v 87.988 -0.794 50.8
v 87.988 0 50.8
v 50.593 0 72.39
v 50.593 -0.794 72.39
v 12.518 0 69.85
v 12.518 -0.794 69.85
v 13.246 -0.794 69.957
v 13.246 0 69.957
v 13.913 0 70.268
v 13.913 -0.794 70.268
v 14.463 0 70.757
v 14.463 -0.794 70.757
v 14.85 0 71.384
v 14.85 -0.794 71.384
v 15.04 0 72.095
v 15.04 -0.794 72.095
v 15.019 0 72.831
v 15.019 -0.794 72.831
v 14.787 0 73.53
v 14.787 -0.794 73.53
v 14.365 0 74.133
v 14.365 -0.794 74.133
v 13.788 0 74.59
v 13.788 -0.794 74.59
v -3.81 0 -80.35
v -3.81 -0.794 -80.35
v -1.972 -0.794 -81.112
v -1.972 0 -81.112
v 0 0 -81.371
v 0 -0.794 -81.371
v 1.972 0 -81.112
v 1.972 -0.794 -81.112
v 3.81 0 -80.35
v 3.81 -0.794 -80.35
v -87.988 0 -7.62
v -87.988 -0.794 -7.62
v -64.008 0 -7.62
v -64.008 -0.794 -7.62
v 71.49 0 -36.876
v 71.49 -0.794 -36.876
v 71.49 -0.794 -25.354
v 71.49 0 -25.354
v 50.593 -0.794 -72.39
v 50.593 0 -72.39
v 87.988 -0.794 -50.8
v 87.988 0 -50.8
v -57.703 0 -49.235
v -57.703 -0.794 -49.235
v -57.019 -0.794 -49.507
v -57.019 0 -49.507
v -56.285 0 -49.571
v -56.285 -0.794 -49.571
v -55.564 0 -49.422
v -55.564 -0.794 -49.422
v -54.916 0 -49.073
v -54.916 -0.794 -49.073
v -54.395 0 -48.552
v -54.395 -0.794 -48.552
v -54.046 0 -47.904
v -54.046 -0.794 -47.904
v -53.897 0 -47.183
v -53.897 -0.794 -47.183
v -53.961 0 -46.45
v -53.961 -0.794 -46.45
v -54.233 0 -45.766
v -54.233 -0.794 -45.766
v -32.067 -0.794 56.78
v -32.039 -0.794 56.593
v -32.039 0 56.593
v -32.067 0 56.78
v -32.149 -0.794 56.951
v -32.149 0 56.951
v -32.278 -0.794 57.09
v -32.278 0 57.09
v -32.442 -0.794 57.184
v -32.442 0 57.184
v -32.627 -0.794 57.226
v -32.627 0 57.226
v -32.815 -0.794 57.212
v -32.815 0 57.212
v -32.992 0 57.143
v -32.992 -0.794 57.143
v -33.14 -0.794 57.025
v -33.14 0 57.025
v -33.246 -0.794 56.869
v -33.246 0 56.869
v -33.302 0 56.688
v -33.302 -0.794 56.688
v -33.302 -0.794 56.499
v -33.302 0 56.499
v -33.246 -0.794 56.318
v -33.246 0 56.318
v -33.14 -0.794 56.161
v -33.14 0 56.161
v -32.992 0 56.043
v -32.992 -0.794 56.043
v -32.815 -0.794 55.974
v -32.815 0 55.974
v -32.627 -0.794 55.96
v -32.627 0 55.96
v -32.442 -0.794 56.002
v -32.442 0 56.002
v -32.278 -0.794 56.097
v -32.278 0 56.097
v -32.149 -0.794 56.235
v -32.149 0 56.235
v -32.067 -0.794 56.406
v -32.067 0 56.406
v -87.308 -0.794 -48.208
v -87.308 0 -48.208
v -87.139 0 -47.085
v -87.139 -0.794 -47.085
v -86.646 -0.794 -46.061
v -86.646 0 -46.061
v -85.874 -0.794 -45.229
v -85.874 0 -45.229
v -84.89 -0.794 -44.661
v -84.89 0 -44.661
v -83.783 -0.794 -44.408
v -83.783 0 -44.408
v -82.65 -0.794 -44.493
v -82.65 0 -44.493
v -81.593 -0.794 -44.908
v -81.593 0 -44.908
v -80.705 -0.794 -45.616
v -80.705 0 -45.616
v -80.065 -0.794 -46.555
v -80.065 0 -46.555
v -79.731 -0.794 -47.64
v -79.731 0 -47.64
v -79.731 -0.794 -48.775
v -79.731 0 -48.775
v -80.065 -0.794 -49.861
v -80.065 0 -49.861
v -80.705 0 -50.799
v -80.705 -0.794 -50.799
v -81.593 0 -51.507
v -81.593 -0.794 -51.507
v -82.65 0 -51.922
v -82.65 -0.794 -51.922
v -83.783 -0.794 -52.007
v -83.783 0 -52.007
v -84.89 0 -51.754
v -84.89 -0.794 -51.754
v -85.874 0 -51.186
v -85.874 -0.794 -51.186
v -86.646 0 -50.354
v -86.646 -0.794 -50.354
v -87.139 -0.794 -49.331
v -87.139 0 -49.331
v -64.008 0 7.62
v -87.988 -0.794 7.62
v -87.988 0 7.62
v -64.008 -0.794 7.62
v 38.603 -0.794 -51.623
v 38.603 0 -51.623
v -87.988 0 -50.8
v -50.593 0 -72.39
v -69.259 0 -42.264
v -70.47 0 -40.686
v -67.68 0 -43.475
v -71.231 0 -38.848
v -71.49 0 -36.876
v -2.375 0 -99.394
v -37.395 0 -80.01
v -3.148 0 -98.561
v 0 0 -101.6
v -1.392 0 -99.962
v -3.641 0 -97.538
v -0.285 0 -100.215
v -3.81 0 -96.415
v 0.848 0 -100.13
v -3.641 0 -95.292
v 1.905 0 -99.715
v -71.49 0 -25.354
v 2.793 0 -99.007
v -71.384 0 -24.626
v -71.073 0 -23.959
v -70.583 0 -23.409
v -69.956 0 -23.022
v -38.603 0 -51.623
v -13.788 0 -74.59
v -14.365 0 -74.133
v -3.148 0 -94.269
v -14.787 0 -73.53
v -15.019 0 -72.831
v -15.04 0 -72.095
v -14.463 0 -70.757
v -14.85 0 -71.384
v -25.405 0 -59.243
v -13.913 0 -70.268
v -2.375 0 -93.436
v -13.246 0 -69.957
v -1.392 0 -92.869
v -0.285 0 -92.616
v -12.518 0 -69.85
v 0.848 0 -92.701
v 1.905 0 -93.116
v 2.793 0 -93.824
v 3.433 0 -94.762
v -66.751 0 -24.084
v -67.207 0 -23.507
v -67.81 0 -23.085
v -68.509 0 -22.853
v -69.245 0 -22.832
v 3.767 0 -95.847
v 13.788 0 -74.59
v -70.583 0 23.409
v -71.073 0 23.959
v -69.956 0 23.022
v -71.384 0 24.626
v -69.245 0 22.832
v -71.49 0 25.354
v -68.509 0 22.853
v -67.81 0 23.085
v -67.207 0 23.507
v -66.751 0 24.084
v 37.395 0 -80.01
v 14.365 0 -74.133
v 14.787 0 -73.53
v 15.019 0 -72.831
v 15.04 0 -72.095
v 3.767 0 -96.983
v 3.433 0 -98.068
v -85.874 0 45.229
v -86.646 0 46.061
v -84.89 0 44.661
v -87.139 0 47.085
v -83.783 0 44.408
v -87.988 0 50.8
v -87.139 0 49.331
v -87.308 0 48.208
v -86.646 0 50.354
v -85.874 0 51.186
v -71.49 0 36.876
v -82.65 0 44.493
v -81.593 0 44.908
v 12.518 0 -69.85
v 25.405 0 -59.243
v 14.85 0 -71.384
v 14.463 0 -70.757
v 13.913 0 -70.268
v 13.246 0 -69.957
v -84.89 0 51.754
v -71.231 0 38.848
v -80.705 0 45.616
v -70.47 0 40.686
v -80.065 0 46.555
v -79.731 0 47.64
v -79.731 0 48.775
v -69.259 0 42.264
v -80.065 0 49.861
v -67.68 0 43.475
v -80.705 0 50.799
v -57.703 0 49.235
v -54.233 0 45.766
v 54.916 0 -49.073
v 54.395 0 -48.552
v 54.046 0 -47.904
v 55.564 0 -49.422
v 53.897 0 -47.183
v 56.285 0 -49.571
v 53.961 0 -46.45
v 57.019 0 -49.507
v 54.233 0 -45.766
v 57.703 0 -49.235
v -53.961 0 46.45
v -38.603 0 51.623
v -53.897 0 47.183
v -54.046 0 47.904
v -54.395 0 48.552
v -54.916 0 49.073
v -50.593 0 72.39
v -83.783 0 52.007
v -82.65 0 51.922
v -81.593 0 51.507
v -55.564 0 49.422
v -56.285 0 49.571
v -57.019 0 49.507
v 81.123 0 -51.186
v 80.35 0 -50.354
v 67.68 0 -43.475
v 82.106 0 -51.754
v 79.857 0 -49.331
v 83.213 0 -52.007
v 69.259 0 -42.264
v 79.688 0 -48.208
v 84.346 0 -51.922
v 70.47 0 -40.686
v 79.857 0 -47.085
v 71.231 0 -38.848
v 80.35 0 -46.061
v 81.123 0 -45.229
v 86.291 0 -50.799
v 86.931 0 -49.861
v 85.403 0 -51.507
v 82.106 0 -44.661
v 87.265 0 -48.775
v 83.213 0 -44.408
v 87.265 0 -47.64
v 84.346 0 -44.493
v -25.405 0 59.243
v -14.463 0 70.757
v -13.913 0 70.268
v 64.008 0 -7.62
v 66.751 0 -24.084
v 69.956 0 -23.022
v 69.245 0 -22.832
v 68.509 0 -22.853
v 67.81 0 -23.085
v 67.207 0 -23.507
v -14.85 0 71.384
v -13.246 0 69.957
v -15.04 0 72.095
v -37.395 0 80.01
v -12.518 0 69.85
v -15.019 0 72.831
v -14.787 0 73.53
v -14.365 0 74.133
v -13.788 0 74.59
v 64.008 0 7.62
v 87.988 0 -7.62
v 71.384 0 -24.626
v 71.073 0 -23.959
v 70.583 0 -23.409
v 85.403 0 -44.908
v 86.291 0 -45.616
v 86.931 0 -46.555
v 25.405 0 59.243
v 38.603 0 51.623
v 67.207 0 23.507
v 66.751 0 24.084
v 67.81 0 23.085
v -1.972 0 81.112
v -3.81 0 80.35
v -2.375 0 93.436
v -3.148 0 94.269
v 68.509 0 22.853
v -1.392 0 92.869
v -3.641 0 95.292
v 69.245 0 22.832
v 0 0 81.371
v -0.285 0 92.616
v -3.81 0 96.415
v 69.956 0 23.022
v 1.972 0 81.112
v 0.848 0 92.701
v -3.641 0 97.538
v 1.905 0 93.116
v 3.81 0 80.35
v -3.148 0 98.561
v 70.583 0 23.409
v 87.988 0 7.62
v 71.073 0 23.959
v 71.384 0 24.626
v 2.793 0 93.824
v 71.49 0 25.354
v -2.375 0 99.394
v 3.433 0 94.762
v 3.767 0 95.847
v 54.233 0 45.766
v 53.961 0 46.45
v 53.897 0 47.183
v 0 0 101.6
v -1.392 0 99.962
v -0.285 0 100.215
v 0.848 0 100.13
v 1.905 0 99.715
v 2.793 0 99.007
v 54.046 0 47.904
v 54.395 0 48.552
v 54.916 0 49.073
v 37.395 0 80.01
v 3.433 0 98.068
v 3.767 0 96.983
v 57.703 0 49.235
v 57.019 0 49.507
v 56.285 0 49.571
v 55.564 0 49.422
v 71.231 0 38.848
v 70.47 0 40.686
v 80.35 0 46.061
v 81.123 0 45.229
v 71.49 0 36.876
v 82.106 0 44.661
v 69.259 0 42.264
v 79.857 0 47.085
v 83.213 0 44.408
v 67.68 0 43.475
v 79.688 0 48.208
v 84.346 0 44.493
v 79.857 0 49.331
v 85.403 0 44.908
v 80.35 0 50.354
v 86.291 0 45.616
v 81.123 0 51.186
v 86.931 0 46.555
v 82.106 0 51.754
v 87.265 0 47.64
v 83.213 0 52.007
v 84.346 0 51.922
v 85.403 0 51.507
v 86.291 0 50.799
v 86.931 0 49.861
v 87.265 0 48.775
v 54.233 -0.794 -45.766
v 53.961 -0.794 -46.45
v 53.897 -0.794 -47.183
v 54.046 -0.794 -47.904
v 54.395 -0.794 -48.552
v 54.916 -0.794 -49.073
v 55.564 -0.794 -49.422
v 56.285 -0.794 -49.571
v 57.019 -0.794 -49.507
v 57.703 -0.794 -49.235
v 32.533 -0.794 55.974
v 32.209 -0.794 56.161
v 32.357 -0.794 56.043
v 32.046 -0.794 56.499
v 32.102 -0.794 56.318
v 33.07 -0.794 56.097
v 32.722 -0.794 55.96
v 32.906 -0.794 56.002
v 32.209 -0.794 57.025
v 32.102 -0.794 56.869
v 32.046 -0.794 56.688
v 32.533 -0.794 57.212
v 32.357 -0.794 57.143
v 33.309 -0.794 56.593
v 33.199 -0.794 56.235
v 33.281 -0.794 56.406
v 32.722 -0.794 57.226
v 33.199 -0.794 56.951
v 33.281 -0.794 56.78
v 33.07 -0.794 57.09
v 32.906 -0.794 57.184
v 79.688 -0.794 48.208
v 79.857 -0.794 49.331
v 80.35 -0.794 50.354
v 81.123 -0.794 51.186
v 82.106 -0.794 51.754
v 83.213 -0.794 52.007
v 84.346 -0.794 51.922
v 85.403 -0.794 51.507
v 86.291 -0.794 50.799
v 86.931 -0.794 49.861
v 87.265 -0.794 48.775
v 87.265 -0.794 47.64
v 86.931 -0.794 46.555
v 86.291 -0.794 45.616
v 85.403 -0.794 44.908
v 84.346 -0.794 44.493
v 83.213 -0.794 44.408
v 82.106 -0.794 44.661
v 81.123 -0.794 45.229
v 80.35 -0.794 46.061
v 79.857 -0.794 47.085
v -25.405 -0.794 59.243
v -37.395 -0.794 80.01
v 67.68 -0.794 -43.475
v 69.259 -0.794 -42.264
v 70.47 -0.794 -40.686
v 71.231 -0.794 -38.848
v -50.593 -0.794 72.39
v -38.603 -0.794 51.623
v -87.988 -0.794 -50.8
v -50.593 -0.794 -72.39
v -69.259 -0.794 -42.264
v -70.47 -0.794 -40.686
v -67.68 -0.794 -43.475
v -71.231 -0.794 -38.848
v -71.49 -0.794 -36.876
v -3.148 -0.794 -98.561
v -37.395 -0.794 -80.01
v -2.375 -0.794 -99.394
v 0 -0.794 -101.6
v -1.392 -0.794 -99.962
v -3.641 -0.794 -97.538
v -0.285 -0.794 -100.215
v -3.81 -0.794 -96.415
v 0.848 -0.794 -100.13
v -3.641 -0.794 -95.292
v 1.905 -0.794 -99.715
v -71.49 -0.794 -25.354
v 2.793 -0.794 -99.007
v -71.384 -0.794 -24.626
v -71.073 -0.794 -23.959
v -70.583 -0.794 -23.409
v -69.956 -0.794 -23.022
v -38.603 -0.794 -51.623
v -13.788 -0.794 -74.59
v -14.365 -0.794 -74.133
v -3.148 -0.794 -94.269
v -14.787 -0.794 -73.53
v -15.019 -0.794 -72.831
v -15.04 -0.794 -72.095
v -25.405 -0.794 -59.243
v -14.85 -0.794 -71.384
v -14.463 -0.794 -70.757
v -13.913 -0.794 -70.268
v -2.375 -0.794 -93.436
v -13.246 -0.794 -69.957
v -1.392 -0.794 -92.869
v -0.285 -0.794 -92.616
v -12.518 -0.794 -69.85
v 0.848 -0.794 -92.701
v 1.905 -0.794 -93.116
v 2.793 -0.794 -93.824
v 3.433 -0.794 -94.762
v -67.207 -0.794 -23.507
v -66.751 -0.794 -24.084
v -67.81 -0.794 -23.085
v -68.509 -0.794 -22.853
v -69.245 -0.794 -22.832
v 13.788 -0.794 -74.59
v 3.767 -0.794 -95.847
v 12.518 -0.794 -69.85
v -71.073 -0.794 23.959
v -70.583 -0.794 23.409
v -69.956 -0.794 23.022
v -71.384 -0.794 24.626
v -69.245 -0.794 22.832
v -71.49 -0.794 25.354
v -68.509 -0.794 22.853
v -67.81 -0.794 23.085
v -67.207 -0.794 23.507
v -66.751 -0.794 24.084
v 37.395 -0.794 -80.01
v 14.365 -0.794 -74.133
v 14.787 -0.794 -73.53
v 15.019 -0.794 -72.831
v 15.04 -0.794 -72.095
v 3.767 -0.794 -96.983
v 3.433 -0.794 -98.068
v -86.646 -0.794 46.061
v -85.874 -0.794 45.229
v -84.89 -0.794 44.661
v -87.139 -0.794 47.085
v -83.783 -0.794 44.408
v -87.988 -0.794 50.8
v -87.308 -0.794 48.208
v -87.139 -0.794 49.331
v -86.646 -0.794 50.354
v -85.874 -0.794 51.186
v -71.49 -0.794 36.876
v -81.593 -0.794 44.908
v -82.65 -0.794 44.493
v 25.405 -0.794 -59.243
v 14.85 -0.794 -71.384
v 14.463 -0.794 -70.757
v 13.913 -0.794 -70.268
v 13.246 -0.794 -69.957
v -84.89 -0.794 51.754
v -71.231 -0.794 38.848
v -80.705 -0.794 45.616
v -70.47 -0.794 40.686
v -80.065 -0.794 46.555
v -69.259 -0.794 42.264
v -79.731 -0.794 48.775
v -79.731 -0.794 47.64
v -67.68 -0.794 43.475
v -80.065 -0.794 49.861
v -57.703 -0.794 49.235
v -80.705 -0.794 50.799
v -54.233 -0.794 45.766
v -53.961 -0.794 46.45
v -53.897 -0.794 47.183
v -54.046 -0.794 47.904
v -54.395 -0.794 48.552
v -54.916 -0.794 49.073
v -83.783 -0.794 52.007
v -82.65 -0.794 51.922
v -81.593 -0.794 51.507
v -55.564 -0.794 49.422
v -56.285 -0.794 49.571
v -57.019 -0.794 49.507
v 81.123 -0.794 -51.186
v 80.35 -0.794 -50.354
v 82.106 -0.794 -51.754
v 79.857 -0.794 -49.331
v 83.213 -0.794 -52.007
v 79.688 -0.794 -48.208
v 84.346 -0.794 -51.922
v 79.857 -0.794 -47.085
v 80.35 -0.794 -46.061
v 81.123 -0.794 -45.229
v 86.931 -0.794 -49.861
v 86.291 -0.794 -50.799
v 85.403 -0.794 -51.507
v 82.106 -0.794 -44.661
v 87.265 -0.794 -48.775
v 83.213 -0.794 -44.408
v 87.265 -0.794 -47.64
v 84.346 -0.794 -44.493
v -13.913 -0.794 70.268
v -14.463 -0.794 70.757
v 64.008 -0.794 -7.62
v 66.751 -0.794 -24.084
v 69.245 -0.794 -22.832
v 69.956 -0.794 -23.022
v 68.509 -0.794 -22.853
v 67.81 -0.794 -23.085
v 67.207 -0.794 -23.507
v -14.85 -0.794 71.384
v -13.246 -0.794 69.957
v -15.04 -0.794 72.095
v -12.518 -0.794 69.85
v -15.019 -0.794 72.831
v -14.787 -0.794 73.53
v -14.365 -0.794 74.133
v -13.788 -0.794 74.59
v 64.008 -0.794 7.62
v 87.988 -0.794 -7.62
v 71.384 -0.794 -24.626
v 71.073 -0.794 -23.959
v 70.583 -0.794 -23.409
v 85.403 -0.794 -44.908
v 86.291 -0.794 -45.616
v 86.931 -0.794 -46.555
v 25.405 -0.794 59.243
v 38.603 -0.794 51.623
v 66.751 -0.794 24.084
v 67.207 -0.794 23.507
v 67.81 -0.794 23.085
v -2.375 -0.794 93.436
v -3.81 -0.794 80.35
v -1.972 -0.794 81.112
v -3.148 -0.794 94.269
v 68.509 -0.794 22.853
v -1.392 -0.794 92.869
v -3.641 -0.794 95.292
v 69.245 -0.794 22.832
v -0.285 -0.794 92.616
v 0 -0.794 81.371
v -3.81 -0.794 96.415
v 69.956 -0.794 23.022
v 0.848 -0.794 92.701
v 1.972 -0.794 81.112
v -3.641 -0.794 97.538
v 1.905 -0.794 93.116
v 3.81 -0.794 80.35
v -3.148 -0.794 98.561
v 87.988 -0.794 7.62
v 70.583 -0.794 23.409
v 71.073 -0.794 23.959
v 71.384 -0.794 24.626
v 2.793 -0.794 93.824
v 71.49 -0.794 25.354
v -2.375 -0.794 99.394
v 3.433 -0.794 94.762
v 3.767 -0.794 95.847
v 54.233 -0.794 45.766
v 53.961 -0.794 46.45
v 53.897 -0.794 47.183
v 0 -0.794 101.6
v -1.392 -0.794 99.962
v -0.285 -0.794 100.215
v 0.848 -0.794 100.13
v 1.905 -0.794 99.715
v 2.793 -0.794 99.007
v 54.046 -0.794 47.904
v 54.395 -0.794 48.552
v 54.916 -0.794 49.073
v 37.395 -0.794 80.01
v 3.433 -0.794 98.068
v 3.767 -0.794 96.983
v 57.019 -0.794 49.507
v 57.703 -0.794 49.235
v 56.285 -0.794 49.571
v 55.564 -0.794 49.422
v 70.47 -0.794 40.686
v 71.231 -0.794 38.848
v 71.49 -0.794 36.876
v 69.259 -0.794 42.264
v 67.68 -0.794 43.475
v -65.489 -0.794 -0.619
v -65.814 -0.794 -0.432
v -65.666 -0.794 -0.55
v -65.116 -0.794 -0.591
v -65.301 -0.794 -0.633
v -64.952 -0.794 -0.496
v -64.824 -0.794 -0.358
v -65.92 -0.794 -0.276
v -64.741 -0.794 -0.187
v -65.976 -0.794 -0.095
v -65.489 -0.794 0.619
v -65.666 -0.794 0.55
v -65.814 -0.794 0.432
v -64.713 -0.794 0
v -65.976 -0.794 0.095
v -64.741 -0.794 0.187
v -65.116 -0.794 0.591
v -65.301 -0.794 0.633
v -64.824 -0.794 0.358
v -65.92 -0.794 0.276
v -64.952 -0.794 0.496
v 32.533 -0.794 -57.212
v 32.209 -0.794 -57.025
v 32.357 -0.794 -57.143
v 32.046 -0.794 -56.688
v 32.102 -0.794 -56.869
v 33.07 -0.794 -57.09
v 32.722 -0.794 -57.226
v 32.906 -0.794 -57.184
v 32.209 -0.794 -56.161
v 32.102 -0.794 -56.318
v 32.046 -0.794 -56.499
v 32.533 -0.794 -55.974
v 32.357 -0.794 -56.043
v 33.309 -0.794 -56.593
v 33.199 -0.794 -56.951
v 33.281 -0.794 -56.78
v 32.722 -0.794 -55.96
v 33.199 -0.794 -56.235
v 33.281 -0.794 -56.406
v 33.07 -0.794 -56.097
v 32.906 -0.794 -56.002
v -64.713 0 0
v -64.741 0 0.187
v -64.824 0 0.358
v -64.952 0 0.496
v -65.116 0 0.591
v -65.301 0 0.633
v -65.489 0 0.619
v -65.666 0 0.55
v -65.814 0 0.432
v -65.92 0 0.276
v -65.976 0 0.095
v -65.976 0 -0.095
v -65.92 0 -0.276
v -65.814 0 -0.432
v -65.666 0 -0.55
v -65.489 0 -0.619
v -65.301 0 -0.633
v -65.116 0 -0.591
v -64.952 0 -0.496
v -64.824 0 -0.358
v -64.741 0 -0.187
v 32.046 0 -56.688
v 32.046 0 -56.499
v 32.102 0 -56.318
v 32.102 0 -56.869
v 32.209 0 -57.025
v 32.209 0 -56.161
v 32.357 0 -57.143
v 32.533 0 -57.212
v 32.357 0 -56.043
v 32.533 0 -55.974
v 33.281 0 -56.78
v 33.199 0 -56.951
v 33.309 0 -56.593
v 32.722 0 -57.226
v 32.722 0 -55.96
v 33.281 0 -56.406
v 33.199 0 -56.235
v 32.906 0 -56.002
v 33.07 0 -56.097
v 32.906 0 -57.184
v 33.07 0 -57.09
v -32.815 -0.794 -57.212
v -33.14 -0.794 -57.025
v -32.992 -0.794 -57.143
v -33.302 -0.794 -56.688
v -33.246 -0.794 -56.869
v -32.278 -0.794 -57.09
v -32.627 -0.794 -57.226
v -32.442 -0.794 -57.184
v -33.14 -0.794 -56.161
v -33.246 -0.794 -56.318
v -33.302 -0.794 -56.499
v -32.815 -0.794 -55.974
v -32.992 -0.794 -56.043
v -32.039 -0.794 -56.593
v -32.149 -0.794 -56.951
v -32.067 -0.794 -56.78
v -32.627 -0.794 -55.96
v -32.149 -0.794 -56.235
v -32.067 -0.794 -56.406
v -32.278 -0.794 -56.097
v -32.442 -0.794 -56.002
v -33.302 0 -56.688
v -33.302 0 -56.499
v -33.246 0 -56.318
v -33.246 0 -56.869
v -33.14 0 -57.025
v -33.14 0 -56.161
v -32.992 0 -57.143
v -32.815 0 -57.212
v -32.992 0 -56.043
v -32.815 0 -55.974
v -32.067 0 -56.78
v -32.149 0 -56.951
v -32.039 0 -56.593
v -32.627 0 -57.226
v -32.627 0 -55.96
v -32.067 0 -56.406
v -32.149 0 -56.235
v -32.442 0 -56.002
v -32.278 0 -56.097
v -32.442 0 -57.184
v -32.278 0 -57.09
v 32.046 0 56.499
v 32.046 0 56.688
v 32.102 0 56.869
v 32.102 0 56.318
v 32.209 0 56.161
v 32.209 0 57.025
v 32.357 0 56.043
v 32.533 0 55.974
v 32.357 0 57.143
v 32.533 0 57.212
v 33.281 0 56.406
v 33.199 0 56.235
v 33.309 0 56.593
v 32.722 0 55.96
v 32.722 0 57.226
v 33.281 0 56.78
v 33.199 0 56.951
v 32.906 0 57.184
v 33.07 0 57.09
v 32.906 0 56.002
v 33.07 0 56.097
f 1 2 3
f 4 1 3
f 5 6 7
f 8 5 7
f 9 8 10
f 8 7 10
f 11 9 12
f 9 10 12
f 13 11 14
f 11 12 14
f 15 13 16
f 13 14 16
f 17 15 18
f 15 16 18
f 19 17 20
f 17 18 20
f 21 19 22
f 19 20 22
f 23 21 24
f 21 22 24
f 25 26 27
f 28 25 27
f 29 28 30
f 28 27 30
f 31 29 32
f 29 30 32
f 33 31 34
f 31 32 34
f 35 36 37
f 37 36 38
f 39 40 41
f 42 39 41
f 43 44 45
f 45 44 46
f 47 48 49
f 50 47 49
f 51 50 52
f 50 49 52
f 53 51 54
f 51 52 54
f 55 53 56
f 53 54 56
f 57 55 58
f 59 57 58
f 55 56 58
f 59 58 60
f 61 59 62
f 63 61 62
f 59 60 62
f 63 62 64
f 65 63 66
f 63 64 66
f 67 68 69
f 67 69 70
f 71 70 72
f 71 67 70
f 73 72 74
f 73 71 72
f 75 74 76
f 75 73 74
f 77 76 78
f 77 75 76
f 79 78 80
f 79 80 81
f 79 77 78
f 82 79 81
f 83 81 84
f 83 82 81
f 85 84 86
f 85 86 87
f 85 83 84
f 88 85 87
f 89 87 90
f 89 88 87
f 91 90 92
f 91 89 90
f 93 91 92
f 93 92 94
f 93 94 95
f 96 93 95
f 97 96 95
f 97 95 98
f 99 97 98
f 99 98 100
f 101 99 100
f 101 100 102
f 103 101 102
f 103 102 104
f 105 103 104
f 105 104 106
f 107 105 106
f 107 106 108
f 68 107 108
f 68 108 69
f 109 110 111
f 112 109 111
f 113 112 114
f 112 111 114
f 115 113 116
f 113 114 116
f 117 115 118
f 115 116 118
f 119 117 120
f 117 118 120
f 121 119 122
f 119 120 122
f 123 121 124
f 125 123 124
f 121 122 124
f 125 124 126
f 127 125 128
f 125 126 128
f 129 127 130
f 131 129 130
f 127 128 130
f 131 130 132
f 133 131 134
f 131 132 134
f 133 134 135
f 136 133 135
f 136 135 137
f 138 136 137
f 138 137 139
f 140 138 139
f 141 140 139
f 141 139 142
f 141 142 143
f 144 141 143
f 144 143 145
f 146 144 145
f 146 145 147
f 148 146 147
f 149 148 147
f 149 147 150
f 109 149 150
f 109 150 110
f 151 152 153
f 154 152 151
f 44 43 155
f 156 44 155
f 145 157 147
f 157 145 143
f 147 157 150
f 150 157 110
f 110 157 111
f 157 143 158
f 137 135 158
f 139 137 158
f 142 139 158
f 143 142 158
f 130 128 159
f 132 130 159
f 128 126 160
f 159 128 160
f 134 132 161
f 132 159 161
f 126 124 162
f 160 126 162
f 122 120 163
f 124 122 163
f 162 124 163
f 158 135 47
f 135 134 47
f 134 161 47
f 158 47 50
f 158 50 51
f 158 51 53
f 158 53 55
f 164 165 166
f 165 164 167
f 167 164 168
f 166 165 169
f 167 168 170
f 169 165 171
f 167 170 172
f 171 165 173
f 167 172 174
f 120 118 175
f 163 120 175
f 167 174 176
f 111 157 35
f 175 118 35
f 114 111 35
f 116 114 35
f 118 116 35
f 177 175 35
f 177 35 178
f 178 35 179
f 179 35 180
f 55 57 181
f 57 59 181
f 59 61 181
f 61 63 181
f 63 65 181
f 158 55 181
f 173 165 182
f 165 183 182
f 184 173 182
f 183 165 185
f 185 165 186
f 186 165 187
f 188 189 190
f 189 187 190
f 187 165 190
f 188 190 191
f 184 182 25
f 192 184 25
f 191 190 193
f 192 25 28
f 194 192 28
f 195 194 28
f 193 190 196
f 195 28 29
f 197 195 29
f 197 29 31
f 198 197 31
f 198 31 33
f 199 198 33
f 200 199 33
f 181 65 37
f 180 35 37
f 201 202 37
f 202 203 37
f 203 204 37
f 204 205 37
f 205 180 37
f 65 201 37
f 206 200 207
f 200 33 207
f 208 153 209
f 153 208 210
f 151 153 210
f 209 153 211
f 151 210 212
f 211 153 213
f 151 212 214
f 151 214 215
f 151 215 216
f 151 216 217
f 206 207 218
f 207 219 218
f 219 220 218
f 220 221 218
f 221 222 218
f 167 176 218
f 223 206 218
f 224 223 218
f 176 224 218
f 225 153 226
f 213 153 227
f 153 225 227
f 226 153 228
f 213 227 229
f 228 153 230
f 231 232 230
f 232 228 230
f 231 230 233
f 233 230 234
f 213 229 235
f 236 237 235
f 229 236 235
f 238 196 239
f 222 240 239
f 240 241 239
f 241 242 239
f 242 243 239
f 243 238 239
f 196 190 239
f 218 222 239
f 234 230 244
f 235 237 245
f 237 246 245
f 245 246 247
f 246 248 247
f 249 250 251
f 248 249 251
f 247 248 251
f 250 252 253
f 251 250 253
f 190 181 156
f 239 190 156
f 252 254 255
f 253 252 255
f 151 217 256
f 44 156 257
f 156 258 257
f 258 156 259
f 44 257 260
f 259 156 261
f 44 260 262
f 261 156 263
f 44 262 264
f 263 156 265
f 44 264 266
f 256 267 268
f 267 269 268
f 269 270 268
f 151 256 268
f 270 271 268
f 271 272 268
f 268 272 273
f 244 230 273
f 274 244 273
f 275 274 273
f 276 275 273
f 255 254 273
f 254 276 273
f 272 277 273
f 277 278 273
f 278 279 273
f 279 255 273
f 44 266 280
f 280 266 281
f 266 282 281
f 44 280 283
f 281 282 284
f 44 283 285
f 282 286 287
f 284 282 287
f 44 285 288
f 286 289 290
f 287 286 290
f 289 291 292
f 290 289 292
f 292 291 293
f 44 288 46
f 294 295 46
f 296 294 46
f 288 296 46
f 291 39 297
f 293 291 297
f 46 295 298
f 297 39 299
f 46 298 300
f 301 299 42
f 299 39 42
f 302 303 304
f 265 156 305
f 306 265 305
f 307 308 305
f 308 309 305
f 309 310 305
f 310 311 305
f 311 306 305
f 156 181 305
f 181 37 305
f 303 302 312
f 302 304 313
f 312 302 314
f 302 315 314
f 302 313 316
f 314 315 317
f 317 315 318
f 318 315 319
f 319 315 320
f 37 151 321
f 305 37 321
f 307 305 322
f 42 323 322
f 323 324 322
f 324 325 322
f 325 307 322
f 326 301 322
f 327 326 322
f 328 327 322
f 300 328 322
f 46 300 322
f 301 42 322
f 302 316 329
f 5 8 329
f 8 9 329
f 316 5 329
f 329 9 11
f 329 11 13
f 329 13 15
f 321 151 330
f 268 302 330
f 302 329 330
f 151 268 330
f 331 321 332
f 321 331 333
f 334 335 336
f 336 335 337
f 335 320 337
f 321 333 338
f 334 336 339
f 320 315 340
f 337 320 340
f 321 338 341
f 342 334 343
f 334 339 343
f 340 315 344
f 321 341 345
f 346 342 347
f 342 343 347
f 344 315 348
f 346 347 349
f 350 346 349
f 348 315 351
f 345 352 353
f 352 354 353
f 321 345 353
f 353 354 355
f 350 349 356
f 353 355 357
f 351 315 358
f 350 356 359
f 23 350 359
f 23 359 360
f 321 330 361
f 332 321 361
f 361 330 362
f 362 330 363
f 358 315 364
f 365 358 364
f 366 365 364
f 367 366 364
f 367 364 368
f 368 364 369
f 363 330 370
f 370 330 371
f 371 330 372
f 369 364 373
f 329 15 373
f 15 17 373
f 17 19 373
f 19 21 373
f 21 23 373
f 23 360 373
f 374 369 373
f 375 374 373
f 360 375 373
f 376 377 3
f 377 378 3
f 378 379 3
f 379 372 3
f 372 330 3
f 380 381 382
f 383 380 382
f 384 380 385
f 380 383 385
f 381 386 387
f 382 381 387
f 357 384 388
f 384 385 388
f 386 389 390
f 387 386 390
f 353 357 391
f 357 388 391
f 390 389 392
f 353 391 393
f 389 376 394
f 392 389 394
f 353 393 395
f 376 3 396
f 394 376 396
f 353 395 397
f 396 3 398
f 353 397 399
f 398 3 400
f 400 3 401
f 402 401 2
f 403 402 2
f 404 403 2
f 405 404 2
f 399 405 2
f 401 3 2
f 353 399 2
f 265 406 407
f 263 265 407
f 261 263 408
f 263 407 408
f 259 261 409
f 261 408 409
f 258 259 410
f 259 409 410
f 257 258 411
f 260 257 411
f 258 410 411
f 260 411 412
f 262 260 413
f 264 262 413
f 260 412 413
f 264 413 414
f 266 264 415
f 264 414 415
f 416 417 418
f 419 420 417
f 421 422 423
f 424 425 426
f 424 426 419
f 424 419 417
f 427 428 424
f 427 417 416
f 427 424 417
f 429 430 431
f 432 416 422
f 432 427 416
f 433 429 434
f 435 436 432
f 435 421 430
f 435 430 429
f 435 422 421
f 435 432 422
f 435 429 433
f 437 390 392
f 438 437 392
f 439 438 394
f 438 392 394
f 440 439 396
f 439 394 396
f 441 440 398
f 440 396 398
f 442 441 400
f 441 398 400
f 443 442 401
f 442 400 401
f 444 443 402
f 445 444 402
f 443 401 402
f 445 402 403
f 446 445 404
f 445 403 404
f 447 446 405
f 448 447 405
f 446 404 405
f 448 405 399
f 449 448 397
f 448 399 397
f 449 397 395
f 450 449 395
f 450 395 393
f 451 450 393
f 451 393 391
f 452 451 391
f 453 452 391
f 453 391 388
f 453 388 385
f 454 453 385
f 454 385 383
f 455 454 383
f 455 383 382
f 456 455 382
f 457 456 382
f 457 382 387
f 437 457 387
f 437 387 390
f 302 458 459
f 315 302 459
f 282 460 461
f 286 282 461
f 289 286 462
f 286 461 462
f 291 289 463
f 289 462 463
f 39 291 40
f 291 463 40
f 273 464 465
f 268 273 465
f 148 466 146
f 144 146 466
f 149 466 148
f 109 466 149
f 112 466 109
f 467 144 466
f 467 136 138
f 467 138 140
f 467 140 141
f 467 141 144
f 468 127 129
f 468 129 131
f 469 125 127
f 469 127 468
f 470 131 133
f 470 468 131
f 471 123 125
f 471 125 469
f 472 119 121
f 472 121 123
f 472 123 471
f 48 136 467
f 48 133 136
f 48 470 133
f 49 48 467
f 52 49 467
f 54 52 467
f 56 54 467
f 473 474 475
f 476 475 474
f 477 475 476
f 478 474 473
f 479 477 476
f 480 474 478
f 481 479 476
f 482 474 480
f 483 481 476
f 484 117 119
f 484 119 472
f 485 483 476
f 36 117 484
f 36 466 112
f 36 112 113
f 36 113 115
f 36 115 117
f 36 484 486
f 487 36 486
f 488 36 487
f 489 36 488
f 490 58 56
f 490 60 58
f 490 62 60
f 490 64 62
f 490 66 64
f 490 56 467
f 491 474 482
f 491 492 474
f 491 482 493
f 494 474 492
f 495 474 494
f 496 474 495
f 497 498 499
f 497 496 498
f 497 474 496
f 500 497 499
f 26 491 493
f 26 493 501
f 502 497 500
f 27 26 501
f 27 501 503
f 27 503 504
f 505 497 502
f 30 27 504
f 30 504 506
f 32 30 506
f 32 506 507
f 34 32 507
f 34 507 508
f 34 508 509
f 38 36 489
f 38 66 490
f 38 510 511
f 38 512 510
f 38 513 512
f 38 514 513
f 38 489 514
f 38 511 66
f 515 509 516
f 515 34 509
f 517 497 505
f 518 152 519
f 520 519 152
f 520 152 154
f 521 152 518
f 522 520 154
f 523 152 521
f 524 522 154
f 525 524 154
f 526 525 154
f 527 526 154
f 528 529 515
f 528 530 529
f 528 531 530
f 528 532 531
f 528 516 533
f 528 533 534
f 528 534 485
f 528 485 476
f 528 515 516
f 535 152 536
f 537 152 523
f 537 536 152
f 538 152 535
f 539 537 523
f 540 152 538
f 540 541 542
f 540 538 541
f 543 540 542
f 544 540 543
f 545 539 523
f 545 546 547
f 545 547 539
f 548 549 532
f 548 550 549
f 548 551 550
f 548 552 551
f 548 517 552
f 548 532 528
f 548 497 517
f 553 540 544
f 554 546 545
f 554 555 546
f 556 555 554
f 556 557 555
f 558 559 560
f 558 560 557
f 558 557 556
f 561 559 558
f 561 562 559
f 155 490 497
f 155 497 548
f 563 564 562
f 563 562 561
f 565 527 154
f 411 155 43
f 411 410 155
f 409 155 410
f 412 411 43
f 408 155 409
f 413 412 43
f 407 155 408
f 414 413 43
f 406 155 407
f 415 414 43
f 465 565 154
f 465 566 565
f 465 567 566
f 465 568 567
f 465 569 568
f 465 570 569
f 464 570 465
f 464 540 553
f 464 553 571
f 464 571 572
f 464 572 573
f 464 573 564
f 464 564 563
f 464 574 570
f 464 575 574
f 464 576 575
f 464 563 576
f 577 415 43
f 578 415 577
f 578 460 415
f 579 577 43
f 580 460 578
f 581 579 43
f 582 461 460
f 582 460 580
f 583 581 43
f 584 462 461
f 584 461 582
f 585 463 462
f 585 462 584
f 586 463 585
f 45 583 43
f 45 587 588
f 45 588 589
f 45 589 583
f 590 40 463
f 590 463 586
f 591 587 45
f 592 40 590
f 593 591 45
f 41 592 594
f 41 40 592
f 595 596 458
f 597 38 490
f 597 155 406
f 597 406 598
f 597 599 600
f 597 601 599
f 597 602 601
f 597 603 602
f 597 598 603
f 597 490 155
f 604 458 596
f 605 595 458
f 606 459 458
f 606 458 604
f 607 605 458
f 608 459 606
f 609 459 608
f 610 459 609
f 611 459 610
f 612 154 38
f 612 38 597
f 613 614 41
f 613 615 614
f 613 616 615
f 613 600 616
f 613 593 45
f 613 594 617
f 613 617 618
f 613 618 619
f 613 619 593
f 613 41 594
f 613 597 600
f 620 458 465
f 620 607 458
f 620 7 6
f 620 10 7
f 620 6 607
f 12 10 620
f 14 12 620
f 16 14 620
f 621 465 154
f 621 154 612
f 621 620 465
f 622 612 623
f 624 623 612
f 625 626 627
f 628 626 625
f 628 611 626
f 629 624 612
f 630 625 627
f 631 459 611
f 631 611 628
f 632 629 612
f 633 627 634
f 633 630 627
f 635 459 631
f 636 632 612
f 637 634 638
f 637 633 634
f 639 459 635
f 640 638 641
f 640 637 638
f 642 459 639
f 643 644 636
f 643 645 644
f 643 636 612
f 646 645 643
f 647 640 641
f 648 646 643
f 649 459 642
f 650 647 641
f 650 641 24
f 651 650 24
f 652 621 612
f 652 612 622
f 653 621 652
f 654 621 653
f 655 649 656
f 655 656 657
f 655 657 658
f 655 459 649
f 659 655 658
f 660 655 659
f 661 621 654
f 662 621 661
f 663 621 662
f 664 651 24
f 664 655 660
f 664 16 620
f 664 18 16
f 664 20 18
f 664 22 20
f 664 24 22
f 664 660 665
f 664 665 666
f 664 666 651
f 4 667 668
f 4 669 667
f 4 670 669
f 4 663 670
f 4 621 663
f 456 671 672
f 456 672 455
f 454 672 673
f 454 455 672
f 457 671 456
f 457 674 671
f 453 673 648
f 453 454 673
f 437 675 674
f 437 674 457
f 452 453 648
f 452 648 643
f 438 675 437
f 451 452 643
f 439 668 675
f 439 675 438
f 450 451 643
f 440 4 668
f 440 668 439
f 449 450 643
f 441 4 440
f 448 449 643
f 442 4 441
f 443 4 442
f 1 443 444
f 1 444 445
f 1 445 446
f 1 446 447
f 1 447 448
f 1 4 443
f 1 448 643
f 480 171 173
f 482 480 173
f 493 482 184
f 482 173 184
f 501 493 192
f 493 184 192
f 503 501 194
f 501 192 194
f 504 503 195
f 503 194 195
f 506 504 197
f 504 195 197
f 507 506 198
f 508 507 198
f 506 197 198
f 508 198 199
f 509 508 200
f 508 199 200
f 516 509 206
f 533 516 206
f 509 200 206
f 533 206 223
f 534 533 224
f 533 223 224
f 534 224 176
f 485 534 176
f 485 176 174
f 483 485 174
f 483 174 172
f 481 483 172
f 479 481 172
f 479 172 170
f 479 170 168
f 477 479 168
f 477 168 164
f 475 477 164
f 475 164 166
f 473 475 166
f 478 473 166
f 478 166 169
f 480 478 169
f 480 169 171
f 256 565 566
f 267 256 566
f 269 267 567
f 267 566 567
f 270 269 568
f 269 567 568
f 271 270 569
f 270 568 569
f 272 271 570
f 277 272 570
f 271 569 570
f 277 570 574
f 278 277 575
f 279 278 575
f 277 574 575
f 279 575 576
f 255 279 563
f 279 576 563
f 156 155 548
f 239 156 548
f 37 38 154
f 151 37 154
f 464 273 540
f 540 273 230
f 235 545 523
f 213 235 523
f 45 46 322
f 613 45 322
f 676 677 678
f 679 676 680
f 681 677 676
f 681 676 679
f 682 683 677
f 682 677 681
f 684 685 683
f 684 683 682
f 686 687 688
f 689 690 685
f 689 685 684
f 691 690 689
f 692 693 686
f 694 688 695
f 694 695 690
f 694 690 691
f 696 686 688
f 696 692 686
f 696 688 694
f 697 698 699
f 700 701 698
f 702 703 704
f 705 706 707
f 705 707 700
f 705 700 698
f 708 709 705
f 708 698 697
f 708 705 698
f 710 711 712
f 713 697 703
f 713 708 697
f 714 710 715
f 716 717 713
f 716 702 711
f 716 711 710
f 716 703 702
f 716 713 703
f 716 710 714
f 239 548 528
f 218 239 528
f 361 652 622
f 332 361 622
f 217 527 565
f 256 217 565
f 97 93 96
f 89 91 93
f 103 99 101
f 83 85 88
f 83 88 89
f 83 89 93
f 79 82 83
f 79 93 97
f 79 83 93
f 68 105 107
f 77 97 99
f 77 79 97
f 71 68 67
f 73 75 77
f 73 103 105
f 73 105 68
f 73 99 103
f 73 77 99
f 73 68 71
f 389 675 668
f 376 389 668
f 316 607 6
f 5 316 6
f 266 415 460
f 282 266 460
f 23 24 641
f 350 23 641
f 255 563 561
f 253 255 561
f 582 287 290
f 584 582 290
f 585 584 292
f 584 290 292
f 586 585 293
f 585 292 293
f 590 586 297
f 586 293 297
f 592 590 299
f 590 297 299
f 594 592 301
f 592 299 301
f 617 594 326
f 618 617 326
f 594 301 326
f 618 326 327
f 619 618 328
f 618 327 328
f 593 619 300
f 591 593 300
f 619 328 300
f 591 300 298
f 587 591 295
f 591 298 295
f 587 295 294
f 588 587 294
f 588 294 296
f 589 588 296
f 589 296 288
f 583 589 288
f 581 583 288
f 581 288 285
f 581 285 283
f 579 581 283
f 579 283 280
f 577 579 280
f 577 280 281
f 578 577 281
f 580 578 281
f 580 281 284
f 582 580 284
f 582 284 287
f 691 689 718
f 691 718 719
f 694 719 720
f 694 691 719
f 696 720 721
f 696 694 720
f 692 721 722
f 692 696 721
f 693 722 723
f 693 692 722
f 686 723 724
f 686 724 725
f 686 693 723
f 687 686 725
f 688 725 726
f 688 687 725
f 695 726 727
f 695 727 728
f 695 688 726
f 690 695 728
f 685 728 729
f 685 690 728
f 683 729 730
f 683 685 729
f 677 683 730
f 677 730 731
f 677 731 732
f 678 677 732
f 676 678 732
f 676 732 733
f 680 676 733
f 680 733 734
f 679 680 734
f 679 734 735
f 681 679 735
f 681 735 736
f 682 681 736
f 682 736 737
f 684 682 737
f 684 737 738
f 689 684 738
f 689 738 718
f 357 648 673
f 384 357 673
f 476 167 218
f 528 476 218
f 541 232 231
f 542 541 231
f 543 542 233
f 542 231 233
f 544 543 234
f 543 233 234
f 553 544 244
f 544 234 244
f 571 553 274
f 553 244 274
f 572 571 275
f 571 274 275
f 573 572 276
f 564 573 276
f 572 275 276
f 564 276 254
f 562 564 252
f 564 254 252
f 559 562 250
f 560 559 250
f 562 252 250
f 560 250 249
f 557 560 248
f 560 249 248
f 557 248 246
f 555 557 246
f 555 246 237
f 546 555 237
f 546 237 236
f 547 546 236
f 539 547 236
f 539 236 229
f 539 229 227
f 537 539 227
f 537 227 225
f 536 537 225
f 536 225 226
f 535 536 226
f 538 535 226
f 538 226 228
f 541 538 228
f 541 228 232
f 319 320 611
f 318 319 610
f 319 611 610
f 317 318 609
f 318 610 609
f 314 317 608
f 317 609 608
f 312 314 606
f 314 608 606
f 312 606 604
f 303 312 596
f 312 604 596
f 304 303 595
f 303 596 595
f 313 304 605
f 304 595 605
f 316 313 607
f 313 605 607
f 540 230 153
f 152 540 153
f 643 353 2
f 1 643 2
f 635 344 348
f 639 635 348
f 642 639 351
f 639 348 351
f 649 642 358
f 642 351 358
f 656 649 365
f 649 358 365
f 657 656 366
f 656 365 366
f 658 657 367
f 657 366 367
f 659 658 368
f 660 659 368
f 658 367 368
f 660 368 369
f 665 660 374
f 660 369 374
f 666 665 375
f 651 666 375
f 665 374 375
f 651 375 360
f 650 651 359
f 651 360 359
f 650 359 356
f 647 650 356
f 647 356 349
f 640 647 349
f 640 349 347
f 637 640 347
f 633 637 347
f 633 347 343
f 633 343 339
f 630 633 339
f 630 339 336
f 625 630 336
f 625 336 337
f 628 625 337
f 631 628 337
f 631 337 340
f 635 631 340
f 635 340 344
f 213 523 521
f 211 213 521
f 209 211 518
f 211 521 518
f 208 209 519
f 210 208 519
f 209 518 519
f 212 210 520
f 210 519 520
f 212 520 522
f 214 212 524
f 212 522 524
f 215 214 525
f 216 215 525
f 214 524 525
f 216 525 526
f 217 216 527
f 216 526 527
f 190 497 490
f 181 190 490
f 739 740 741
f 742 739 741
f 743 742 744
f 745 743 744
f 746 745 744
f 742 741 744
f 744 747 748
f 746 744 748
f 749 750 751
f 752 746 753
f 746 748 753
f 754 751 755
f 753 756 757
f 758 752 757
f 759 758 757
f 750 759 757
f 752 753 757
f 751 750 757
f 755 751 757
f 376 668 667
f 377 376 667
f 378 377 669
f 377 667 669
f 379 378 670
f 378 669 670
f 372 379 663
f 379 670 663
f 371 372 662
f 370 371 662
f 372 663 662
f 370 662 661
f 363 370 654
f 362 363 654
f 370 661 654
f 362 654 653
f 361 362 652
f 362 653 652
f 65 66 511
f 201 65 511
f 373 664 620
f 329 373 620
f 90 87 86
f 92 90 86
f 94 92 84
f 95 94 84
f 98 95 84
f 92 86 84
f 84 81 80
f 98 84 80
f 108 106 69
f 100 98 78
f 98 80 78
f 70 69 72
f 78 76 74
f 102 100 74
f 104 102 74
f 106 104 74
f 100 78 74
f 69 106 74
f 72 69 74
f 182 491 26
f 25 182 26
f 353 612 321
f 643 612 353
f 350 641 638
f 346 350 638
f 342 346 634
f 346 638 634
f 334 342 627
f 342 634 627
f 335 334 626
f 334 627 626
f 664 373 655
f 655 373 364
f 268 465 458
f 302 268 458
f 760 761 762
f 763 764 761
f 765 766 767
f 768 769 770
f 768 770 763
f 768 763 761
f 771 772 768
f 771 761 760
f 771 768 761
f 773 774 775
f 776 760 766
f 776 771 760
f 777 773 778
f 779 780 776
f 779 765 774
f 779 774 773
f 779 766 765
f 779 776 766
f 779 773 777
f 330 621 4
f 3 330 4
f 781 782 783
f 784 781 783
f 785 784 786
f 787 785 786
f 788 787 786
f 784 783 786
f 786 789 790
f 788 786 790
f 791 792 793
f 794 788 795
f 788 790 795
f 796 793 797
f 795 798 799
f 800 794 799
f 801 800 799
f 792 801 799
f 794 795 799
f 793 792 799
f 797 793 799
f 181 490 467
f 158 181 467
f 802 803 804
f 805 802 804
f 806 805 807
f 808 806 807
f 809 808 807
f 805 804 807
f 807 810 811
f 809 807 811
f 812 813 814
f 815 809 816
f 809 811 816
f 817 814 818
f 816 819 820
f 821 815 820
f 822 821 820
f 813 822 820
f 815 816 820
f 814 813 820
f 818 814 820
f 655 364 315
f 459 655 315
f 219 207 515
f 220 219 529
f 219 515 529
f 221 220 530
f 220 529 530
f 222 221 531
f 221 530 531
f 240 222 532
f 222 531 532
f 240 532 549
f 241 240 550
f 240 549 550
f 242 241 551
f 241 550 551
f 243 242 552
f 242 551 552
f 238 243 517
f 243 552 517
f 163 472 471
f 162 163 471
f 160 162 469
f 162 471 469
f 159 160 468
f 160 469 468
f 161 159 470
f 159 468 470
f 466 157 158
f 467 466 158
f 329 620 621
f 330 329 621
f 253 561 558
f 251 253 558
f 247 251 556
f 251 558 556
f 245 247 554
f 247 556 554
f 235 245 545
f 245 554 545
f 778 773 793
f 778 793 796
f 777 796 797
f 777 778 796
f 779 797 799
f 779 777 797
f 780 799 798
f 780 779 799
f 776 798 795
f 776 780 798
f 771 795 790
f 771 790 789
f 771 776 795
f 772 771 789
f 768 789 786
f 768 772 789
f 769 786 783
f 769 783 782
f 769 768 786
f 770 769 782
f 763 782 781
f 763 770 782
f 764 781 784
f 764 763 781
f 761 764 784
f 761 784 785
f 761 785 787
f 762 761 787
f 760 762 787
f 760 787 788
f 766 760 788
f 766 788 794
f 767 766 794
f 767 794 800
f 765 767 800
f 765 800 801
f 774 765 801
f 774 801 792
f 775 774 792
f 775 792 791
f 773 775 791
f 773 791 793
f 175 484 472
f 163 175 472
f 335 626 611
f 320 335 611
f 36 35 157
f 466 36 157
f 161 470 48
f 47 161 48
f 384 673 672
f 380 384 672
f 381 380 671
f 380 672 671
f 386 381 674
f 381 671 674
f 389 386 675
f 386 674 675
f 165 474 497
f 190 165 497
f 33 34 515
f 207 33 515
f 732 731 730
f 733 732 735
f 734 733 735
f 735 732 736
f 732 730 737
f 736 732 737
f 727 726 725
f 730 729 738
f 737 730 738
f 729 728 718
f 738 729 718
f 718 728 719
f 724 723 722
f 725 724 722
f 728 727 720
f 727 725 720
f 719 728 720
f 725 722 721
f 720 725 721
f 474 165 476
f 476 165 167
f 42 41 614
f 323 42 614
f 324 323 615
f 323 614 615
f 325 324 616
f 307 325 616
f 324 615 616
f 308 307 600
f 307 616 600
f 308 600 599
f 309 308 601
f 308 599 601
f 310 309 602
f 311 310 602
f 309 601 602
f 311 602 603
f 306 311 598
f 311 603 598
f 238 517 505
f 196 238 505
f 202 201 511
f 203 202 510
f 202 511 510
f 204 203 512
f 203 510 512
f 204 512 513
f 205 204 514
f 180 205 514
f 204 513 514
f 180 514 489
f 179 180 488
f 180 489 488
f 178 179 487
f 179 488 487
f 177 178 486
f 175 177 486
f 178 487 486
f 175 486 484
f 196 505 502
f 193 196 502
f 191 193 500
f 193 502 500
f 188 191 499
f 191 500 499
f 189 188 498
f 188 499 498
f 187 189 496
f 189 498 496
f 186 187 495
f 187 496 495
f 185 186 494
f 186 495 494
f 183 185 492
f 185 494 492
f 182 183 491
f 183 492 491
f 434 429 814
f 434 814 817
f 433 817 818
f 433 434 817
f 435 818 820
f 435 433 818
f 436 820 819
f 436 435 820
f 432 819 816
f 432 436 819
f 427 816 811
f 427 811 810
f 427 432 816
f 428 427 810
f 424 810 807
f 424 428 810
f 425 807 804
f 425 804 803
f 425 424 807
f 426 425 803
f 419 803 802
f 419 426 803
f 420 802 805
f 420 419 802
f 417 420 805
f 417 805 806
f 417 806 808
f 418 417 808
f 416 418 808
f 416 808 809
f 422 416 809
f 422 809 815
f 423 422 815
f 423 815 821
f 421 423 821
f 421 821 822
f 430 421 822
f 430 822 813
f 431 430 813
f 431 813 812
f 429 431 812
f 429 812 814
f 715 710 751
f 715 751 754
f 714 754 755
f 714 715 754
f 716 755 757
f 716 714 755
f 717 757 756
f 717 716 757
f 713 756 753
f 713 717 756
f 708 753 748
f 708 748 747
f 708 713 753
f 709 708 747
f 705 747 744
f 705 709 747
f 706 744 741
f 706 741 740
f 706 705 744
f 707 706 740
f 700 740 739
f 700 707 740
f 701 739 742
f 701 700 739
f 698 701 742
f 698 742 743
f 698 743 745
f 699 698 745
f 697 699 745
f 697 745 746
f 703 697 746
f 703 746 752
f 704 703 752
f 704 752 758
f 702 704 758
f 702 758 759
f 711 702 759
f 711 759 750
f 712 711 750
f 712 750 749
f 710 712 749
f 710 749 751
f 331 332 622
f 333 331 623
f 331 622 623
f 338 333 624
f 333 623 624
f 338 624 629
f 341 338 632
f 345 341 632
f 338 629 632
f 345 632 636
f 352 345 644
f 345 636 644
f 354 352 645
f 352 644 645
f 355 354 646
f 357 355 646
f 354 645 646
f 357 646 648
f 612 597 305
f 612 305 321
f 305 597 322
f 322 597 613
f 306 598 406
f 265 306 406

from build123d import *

# Parameters (mm, degrees)
F1_DEPTH  = 0.79375
F4_W      = 30.48
F4_H      = 15.24
F4_R      = 0.635
F5_DEPTH  = 0.79475
F7_D      = 7.62
F10_DEPTH = 0.79475


with BuildPart() as f1:
    # F0 (on Front) → F1 (new body)
    with BuildSketch(Plane.XZ):
        Polygon((87.988181, 50.8), (0, 101.6), (-87.988181, 50.8), (-87.988181, -50.8), (0, -101.6), (87.988181, -50.8), align=None)
    extrude(amount=F1_DEPTH)

    # F4 (on face) → F5 (cut, through all)
    with BuildSketch(Plane.XZ.offset(0.79375)):
        with Locations((79.248181, 0)):
            Rectangle(F4_W, F4_H)
        Polygon((25.404977, 59.242711), (38.603204, 51.622711), (53.843204, 78.019165), (40.644977, 85.639165), align=None)
        with Locations((32.674091, 56.593185)):
            Circle(F4_R, mode=Mode.SUBTRACT)
        with Locations((46.574091, 80.668691)):
            Circle(F4_R, mode=Mode.SUBTRACT)
        Polygon((-38.603204, 51.622711), (-25.404977, 59.242711), (-40.644977, 85.639165), (-53.843204, 78.019165), align=None)
        with Locations((-32.674091, 56.593185)):
            Circle(F4_R, mode=Mode.SUBTRACT)
        with Locations((-46.574091, 80.668691)):
            Circle(F4_R, mode=Mode.SUBTRACT)
        with Locations((-79.248181, 0)):
            Rectangle(F4_W, F4_H)
        with Locations((-93.148181, 0)):
            Circle(F4_R, mode=Mode.SUBTRACT)
        with Locations((-65.348181, 0)):
            Circle(F4_R, mode=Mode.SUBTRACT)
        Polygon((-25.404977, -59.242711), (-38.603204, -51.622711), (-53.843204, -78.019165), (-40.644977, -85.639165), align=None)
        with Locations((-46.574091, -80.668691)):
            Circle(F4_R, mode=Mode.SUBTRACT)
        with Locations((-32.674091, -56.593185)):
            Circle(F4_R, mode=Mode.SUBTRACT)
        Polygon((38.603204, -51.622711), (25.404977, -59.242711), (40.644977, -85.639165), (53.843204, -78.019165), align=None)
        with Locations((46.574091, -80.668691)):
            Circle(F4_R, mode=Mode.SUBTRACT)
        with Locations((32.674091, -56.593185)):
            Circle(F4_R, mode=Mode.SUBTRACT)
    extrude(amount=-F5_DEPTH, mode=Mode.SUBTRACT)

    # F7 (through all)
    with Locations(Plane.XZ.offset(0.79375)):
        with Locations((83.498053, -48.207623), (0, -96.415247), (-83.498053, -48.207623), (-83.498053, 48.207623), (0, 96.415247), (83.498053, 48.207623)):
            Hole(F7_D / 2)

    # F9 (on face) → F10 (cut, through all)
    with BuildSketch(Plane.XZ.offset(0.79375)):
        with BuildLine():
            ThreePointArc((-13.787636, 74.589705), (-14.971088, 71.7326), (-12.517636, 69.85))
            Line((-12.517636, 69.85), (12.517636, 69.85))
            ThreePointArc((12.517636, 69.85), (14.971088, 71.7326), (13.787636, 74.589705))
            Line((13.787636, 74.589705), (3.81, 80.350295))
            ThreePointArc((3.81, 80.350295), (0, 81.371182), (-3.81, 80.350295))
            Line((-3.81, 80.350295), (-13.787636, 74.589705))
        make_face()
        with BuildLine():
            ThreePointArc((-54.233056, 45.765591), (-54.63671, 48.831642), (-57.702761, 49.235295))
            Line((-57.702761, 49.235295), (-67.680397, 43.474705))
            ThreePointArc((-67.680397, 43.474705), (-70.469511, 40.685591), (-71.490397, 36.875591))
            Line((-71.490397, 36.875591), (-71.490397, 25.354409))
            ThreePointArc((-71.490397, 25.354409), (-69.607797, 22.900957), (-66.750693, 24.084409))
            Line((-66.750693, 24.084409), (-54.233056, 45.765591))
        make_face()
        with BuildLine():
            ThreePointArc((-66.750693, -24.084409), (-69.607797, -22.900957), (-71.490397, -25.354409))
            Line((-71.490397, -25.354409), (-71.490397, -36.875591))
            ThreePointArc((-71.490397, -36.875591), (-70.469511, -40.685591), (-67.680397, -43.474705))
            Line((-67.680397, -43.474705), (-57.702761, -49.235295))
            ThreePointArc((-57.702761, -49.235295), (-54.63671, -48.831642), (-54.233056, -45.765591))
            Line((-54.233056, -45.765591), (-66.750693, -24.084409))
        make_face()
        with BuildLine():
            ThreePointArc((-12.517636, -69.85), (-14.971088, -71.7326), (-13.787636, -74.589705))
            Line((-13.787636, -74.589705), (-3.81, -80.350295))
            ThreePointArc((-3.81, -80.350295), (0, -81.371182), (3.81, -80.350295))
            Line((3.81, -80.350295), (13.787636, -74.589705))
            ThreePointArc((13.787636, -74.589705), (14.971088, -71.7326), (12.517636, -69.85))
            Line((12.517636, -69.85), (-12.517636, -69.85))
        make_face()
        with BuildLine():
            ThreePointArc((54.233056, -45.765591), (54.63671, -48.831642), (57.702761, -49.235295))
            Line((57.702761, -49.235295), (67.680397, -43.474705))
            ThreePointArc((67.680397, -43.474705), (70.469511, -40.685591), (71.490397, -36.875591))
            Line((71.490397, -36.875591), (71.490397, -25.354409))
            ThreePointArc((71.490397, -25.354409), (69.607797, -22.900957), (66.750693, -24.084409))
            Line((66.750693, -24.084409), (54.233056, -45.765591))
        make_face()
        with BuildLine():
            ThreePointArc((66.750693, 24.084409), (69.607797, 22.900957), (71.490397, 25.354409))
            Line((71.490397, 25.354409), (71.490397, 36.875591))
            ThreePointArc((71.490397, 36.875591), (70.469511, 40.685591), (67.680397, 43.474705))
            Line((67.680397, 43.474705), (57.702761, 49.235295))
            ThreePointArc((57.702761, 49.235295), (54.63671, 48.831642), (54.233056, 45.765591))
            Line((54.233056, 45.765591), (66.750693, 24.084409))
        make_face()
    extrude(amount=-F10_DEPTH, mode=Mode.SUBTRACT)


solid = f1.part
